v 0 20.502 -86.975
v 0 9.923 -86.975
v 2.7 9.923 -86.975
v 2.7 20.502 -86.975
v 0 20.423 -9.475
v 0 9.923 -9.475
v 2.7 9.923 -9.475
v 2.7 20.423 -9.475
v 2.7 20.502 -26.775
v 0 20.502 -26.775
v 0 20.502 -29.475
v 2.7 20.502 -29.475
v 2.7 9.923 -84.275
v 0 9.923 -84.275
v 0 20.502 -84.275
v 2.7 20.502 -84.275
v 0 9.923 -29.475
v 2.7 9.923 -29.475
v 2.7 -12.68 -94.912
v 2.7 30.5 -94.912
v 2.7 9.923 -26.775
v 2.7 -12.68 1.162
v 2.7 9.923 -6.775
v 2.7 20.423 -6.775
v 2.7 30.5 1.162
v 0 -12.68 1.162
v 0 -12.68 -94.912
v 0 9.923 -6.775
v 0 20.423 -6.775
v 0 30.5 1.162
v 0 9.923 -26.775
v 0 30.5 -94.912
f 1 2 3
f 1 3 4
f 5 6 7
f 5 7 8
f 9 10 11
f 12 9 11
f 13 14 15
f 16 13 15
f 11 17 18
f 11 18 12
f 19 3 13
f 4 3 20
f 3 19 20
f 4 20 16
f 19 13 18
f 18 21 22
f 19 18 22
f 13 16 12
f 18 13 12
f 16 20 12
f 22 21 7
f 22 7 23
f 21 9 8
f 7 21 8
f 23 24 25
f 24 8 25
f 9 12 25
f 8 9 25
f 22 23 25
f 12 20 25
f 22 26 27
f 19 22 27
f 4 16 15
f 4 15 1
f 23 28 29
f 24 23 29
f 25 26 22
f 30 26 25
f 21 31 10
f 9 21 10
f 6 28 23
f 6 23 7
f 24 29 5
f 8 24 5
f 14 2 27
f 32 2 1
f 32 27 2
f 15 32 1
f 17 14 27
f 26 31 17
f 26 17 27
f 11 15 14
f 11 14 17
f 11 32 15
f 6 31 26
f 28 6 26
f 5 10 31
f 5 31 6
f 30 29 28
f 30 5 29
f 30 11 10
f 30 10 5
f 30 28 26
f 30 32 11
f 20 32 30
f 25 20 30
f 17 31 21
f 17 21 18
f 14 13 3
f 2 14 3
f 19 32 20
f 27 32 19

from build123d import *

# Parameters (mm, degrees)
SKETCH1_W   = 2.7
SKETCH1_H   = 10.5
SKETCH1_H_2 = 10.579195959
PANEL_DEPTH = 2.7


with BuildPart() as part:
    # Sketch1 → Panel (new body)
    with BuildSketch(Plane(origin=(0, 0, 0), x_dir=(0, 0, -1), z_dir=(1, 0, 0))):
        Polygon((3.2125, 30.5), (83.4125, 30.5), (94.9125, 30.5), (94.9125, -12.68), (86.975, -12.68), (6.775, -12.68), (-1.1625, -12.68), (-1.1625, 30.5), align=None)
        with Locations((8.125, 15.172642531)):
            Rectangle(SKETCH1_W, SKETCH1_H, mode=Mode.SUBTRACT)
        with Locations((85.625, 15.212240511)):
            Rectangle(SKETCH1_W, SKETCH1_H_2, mode=Mode.SUBTRACT)
        with Locations((28.125, 15.212240511)):
            Rectangle(SKETCH1_W, SKETCH1_H_2, mode=Mode.SUBTRACT)
    extrude(amount=PANEL_DEPTH)


solid = part.part
